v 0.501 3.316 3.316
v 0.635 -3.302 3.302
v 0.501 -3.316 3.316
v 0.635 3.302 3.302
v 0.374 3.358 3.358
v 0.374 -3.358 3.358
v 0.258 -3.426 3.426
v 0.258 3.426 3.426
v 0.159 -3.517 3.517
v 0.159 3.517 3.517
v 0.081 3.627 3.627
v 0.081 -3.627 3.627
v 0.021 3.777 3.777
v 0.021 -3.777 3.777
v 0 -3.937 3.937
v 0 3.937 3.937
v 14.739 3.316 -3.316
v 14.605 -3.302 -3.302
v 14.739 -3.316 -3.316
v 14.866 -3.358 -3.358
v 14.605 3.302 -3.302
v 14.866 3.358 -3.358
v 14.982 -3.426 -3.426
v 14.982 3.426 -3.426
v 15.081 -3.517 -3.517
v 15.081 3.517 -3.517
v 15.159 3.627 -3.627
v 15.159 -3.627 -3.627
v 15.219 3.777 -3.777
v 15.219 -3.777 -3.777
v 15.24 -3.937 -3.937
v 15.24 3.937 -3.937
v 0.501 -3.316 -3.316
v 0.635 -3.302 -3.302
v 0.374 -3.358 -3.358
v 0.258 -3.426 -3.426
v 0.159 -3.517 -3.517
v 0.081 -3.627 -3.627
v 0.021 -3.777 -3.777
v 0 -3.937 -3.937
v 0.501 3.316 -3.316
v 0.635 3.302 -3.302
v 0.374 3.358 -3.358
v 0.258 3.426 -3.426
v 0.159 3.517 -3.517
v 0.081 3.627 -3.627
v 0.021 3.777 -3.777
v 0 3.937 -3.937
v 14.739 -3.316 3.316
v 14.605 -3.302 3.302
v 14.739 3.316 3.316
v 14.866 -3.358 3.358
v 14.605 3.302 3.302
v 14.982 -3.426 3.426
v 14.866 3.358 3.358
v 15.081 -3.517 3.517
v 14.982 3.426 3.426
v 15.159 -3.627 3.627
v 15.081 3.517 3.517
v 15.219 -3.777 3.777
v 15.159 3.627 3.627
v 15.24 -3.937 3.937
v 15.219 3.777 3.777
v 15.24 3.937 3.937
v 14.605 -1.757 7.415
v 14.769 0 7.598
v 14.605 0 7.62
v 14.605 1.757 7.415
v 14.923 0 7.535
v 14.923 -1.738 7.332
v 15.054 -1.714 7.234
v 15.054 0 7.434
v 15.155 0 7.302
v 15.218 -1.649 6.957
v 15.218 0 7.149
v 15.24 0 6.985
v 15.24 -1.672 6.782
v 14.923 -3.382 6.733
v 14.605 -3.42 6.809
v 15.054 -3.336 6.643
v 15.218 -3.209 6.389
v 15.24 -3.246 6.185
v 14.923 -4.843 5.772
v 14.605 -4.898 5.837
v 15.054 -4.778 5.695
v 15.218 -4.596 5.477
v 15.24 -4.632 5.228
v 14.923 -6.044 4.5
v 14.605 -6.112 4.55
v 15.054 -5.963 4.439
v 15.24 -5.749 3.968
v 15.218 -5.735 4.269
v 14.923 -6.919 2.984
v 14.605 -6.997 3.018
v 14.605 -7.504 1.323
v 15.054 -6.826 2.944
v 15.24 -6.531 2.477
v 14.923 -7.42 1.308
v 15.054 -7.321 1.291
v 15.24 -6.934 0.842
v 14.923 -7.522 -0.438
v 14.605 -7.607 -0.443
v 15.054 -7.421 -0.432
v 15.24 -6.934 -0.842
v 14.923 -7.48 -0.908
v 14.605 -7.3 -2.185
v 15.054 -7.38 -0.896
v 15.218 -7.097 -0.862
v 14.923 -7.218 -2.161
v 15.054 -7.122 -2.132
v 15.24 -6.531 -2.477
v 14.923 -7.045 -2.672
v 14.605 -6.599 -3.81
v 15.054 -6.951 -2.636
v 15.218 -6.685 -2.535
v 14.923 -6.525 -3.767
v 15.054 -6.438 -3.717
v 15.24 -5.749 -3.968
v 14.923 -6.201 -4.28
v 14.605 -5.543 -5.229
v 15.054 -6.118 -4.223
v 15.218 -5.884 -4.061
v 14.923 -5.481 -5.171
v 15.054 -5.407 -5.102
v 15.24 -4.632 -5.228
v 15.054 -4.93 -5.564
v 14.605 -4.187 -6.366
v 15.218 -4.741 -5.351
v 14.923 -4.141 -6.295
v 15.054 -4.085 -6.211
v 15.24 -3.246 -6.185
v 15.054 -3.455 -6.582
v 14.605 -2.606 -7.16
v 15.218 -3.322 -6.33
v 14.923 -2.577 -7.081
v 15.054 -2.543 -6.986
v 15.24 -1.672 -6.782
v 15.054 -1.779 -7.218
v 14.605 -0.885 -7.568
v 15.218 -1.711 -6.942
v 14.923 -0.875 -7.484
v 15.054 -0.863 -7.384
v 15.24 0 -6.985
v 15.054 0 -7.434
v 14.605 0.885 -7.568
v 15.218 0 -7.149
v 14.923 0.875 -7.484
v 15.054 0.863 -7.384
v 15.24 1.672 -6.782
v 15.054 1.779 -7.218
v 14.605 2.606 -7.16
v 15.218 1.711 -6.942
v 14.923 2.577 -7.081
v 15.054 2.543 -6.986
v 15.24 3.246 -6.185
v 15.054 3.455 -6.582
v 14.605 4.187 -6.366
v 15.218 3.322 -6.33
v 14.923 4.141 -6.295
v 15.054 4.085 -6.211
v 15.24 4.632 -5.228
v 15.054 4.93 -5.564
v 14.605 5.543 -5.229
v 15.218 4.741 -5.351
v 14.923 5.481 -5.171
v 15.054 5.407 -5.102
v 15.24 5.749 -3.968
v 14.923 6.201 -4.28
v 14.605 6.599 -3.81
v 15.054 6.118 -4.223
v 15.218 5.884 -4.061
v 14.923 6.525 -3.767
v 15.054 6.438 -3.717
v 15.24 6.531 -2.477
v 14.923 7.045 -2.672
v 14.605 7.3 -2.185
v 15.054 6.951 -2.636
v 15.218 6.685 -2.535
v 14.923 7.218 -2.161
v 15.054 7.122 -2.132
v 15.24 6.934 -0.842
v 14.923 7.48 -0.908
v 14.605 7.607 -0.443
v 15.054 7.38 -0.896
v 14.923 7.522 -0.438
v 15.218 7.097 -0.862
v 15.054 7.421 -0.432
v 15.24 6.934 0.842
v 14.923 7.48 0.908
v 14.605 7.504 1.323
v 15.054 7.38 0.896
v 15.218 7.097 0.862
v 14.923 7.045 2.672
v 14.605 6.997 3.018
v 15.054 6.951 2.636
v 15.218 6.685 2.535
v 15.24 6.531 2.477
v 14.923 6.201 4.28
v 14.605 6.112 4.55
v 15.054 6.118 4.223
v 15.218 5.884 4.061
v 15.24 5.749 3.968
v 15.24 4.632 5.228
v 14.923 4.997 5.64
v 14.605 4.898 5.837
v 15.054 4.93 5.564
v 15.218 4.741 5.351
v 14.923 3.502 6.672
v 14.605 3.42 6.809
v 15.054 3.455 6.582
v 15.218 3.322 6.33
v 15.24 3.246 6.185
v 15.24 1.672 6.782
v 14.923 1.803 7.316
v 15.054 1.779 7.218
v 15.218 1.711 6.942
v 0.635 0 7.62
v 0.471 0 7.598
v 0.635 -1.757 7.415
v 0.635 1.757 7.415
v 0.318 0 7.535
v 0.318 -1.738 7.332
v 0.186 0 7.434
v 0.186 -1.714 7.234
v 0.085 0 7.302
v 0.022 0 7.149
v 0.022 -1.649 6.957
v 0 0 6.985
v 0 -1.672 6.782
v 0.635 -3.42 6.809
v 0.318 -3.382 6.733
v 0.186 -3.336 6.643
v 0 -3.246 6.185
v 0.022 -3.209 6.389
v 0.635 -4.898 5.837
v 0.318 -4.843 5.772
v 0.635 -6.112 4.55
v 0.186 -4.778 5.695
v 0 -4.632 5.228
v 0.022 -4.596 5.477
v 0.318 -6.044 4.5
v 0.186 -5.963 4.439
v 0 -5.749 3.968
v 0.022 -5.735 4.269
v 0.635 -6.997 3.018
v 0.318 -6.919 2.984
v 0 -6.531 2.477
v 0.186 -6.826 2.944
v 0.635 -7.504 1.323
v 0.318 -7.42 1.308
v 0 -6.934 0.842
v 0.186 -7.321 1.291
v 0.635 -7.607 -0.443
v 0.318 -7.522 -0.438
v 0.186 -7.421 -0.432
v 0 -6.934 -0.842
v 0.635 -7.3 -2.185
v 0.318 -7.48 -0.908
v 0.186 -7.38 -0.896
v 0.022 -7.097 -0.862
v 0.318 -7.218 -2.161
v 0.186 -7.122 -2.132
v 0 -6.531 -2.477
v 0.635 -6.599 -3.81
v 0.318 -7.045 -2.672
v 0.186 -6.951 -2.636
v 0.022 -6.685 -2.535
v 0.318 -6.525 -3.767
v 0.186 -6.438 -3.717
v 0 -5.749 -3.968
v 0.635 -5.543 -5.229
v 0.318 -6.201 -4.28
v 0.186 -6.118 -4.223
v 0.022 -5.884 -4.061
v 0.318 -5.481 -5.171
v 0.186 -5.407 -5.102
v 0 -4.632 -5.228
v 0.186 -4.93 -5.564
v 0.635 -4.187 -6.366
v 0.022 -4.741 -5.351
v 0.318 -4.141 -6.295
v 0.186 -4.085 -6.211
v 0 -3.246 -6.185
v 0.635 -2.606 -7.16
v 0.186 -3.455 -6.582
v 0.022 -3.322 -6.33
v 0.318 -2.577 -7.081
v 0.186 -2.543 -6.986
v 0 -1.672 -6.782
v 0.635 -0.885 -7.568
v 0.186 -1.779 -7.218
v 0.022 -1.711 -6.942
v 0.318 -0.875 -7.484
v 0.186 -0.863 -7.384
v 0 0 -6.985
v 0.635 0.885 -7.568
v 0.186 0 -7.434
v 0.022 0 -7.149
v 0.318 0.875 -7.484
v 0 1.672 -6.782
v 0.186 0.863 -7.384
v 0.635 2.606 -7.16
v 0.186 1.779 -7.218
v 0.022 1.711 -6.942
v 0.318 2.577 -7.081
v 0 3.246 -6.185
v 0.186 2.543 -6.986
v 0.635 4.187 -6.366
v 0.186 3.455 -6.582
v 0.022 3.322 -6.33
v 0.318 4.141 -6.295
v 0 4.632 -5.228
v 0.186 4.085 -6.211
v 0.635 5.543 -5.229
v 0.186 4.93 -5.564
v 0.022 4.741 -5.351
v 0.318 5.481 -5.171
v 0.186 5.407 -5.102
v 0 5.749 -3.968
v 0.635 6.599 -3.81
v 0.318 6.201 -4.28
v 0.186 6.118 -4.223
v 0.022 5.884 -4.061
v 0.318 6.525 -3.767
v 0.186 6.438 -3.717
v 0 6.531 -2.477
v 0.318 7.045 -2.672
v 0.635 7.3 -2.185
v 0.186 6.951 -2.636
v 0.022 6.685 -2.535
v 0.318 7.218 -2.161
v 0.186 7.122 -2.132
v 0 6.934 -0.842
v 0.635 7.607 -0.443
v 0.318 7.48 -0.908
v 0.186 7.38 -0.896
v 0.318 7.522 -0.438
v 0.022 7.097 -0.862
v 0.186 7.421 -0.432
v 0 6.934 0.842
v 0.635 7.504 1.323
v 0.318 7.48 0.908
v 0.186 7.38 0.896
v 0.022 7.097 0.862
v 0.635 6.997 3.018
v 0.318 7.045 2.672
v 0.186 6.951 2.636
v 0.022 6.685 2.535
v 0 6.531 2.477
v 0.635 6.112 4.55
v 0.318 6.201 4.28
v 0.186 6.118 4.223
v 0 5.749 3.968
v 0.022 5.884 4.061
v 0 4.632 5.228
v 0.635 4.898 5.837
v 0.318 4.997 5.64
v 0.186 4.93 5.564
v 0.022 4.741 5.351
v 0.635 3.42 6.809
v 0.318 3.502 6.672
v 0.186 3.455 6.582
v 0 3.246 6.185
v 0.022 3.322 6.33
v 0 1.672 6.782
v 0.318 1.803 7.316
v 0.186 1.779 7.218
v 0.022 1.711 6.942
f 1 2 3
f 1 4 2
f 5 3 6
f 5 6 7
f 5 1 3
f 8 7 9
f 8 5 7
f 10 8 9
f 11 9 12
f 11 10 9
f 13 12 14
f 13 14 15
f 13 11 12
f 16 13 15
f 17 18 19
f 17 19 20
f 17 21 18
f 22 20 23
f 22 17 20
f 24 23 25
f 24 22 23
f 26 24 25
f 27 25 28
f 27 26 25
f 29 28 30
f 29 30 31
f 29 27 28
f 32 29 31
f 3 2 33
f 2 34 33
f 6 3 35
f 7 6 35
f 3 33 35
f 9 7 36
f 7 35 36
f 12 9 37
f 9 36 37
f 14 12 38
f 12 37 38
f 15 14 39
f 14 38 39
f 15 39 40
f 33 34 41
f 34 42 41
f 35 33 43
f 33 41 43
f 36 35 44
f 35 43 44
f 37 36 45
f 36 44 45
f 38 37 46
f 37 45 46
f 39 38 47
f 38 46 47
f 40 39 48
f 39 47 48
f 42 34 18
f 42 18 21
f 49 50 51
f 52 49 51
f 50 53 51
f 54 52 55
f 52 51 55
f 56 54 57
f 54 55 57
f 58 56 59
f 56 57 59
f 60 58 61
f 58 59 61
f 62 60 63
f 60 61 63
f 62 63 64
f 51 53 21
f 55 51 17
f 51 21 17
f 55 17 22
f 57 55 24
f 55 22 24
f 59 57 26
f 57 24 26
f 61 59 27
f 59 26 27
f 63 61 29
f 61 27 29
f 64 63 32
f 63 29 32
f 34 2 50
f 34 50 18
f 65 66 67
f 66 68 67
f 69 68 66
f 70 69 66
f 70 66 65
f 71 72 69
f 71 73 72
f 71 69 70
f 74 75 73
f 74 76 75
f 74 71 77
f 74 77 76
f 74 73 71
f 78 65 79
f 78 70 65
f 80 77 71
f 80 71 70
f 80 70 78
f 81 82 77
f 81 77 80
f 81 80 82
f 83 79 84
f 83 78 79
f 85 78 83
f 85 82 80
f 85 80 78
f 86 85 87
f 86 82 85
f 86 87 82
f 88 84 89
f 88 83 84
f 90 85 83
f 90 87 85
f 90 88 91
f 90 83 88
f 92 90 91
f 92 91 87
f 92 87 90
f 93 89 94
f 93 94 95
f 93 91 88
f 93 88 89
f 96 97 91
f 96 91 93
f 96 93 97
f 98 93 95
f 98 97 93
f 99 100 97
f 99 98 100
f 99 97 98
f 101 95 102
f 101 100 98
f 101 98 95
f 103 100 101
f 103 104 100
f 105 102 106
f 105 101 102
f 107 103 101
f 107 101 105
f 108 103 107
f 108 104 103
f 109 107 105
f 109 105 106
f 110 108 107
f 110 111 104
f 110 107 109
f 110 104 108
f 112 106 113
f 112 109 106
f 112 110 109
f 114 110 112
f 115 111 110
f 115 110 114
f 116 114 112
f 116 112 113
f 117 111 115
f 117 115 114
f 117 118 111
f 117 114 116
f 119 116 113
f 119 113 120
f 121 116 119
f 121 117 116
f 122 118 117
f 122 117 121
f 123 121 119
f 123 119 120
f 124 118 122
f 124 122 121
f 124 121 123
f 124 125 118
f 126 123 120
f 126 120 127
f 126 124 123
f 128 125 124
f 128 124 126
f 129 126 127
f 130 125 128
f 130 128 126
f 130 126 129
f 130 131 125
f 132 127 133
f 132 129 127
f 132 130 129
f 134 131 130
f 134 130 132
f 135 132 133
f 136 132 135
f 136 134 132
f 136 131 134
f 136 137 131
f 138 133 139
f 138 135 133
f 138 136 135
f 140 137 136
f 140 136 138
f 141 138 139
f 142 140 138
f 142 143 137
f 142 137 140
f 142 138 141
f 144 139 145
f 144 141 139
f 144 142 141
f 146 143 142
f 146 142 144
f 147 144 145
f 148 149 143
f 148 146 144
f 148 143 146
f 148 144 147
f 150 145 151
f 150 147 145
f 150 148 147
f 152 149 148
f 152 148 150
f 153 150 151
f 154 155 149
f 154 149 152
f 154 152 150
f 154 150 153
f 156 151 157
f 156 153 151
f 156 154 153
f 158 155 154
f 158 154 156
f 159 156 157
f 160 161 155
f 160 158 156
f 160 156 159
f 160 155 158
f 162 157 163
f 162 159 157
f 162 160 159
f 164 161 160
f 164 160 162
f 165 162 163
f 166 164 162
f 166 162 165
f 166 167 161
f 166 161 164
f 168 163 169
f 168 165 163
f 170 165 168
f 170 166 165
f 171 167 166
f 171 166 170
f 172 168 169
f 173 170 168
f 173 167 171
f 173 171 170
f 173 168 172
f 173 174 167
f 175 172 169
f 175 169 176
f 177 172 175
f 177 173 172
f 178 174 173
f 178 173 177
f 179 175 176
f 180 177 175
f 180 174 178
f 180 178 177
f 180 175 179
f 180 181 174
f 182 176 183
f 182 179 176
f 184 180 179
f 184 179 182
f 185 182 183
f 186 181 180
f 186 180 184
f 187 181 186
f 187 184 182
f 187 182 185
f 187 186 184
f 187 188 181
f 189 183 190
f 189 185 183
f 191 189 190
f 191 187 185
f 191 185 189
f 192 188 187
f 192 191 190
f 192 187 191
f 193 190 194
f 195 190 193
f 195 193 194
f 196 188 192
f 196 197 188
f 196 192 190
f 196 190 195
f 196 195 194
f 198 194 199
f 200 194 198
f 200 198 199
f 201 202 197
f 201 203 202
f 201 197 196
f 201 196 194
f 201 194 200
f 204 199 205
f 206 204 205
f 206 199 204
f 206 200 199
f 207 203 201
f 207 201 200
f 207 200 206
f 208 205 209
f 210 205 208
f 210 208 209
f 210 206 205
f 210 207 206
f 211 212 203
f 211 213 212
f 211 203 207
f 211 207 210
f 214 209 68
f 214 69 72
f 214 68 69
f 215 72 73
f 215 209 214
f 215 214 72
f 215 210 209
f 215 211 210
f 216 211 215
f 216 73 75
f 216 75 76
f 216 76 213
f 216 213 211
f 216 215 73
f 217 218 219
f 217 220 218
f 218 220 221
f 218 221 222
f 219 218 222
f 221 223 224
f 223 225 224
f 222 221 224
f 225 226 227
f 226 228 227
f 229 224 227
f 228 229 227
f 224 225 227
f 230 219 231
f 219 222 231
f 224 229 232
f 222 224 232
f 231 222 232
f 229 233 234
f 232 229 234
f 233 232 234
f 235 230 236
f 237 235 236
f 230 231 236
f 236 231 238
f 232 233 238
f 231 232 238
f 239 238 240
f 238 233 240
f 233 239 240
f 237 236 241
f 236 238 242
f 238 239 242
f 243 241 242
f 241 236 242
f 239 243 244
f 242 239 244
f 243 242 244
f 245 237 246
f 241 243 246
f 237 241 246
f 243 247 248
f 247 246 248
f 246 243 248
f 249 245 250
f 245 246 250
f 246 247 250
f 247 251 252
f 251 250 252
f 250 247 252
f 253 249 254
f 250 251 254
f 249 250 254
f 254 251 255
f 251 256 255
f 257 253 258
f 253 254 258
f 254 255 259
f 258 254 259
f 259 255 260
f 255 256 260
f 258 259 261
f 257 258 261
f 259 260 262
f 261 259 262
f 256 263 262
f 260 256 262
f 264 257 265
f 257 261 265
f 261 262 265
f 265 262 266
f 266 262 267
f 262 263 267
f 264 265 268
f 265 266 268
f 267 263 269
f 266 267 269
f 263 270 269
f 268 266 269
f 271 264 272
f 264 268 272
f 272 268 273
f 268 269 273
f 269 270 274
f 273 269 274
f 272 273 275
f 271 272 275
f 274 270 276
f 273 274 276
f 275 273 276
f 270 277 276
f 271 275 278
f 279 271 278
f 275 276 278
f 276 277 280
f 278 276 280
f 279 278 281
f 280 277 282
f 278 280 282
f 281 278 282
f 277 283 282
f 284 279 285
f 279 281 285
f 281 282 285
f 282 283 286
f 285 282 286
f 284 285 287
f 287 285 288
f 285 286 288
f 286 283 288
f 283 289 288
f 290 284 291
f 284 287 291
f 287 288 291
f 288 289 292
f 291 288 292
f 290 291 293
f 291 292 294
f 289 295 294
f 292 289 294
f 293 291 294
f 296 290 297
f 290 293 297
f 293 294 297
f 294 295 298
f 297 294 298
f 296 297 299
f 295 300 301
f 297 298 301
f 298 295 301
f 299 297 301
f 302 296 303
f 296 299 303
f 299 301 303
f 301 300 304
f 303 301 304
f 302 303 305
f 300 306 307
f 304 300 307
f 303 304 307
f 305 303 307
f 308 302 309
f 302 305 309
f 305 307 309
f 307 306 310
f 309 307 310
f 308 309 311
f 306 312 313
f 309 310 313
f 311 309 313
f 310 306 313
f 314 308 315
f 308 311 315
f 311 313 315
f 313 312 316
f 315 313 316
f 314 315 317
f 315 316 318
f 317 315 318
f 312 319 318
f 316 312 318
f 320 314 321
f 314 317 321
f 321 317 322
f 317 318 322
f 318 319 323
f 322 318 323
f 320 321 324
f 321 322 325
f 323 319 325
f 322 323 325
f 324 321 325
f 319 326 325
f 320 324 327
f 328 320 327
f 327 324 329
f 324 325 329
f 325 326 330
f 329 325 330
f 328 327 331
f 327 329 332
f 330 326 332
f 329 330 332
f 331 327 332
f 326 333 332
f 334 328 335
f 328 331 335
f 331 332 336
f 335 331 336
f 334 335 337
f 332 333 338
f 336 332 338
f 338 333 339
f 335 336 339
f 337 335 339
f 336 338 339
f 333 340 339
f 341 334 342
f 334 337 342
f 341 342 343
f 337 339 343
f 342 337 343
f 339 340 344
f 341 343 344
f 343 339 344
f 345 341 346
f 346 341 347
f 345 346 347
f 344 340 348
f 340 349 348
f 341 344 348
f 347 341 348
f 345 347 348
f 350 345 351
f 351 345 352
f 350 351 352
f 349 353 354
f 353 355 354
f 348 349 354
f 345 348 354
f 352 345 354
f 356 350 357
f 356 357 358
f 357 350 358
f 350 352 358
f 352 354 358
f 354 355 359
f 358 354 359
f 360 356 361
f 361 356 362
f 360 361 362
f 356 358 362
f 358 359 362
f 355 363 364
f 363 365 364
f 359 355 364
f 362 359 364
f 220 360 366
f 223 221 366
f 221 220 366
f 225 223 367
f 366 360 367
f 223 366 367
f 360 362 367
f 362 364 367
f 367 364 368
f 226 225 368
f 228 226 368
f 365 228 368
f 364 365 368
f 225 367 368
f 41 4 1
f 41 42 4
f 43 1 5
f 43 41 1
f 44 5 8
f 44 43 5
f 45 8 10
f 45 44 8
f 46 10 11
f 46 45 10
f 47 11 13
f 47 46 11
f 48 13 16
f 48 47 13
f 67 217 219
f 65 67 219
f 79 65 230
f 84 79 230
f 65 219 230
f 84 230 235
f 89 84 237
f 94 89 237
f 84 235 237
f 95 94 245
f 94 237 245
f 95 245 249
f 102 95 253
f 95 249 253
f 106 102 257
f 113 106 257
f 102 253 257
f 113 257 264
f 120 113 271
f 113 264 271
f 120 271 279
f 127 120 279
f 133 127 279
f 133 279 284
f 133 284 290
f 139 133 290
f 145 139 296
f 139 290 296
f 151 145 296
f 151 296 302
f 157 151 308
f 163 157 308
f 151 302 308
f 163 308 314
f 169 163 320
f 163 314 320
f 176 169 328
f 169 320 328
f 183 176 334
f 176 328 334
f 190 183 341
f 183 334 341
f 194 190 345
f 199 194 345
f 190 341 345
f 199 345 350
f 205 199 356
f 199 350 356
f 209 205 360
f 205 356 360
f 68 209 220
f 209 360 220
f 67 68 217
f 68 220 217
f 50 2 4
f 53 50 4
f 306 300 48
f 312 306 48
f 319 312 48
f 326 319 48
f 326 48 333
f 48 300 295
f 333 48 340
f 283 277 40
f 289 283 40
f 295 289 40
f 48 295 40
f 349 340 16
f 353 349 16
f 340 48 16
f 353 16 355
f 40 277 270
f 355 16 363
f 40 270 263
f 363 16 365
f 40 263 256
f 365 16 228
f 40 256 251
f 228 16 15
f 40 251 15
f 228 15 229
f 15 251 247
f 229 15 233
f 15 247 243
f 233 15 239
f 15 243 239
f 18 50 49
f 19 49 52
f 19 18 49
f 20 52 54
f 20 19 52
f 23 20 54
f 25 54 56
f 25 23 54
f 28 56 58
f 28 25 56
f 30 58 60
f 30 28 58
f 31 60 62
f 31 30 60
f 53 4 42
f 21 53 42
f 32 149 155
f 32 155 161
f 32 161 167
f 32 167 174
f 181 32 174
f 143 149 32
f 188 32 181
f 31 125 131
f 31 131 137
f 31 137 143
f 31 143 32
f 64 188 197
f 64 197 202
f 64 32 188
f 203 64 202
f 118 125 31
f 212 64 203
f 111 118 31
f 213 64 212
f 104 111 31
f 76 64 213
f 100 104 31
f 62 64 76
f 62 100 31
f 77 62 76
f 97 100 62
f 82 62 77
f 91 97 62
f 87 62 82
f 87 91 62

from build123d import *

# Parameters (mm, degrees)
SKETCH1_R           = 7.62
SKETCH1_W           = 6.604
SKETCH1_H           = 6.604
BOSS_EXTRUDE1_DEPTH = 15.24
FILLET1_R           = 0.635


with BuildPart() as part:
    # Sketch1 → Boss-Extrude1 (new body)
    with BuildSketch(Plane(origin=(0, 0, 0), x_dir=(0, 0, -1), z_dir=(1, 0, 0))):
        with Locations(Location((0, 0, 0), (0, 0, 180))):
            Circle(SKETCH1_R)
        Rectangle(SKETCH1_W, SKETCH1_H, mode=Mode.SUBTRACT)
    extrude(amount=BOSS_EXTRUDE1_DEPTH)

    # Fillet1
    fillet1_edges = [part.edges().sort_by_distance(p)[0] for p in [
        (15.24, 0, 3.302),
        (15.24, -3.302, 0),
        (0, 0, -7.62),
        (15.24, 0, -7.62),
        (0, 0, -3.302),
        (0, 3.302, 0),
        (0, 0, 3.302),
        (0, -3.302, 0),
        (15.24, 0, -3.302),
        (15.24, 3.302, 0),
    ]]
    fillet(fillet1_edges, radius=FILLET1_R)


solid = part.part
